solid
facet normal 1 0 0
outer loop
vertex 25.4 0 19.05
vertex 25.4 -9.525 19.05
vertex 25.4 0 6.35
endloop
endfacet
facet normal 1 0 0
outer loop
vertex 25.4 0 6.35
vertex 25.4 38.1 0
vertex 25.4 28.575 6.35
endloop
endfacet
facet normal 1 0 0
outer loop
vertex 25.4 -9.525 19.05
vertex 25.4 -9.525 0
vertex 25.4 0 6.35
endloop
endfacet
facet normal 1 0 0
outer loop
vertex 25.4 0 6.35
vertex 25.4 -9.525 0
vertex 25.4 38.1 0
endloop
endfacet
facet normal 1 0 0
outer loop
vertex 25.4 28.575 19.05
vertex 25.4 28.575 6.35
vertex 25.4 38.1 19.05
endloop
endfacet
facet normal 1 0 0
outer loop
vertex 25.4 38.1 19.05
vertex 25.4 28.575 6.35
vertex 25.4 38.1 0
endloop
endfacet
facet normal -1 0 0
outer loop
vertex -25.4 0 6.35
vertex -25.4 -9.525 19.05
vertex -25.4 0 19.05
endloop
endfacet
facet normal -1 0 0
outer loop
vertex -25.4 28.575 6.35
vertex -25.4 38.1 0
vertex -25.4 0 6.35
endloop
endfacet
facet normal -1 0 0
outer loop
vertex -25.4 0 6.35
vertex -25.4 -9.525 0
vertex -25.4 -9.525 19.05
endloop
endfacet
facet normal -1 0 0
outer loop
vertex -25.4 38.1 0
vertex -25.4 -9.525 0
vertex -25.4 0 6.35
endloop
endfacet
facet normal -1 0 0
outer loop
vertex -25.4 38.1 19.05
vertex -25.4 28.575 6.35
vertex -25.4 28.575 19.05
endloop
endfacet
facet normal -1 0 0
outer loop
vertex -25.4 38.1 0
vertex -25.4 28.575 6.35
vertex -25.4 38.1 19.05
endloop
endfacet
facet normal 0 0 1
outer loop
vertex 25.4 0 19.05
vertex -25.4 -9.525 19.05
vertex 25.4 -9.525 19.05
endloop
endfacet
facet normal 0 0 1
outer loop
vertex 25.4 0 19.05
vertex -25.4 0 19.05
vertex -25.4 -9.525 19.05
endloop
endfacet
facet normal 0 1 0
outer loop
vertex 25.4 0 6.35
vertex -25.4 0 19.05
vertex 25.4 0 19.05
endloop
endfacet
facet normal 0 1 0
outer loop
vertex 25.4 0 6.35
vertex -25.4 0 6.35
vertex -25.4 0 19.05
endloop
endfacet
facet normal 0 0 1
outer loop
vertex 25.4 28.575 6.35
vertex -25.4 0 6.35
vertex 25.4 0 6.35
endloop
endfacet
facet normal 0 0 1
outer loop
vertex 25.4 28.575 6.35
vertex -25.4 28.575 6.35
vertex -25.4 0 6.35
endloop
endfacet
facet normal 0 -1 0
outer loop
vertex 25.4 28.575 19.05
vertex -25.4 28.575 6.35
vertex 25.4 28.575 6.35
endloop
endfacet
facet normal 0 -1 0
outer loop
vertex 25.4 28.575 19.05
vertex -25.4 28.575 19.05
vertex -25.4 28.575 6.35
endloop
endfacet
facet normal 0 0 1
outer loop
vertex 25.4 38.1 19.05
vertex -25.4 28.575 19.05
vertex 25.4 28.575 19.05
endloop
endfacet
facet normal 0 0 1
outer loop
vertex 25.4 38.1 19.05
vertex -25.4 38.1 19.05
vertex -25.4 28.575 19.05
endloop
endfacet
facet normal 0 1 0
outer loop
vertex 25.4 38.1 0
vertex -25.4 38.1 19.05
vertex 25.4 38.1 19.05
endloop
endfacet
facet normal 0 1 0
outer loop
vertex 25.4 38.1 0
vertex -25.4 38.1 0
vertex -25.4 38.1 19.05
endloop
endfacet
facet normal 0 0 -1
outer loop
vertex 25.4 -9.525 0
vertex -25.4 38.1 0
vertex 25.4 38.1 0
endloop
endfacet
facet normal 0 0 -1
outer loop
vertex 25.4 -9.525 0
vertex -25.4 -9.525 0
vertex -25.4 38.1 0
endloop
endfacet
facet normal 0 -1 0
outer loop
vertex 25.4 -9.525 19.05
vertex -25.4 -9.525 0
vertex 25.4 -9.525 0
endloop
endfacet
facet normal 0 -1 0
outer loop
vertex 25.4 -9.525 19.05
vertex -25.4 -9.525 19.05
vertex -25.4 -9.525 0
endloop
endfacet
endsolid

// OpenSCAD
module showerDoorstop() {
    length = 128;
    height = 48;
    innerWidth = 72;
    wallThickness = 24;
    floorThickness = 16;
    scaleFactor = 25.4 / 64;
   
   
    module _floor() {
        polygon(points=[
            [0, 0],
            [0, innerWidth],
            [floorThickness, innerWidth],
            [floorThickness, 0],
        ]);
    };
    
    module _side() {
        polygon(points=[
            [0, 0],
            [0, wallThickness],
            [height, wallThickness],
            [height, 0],
        ]);
    }
    
    scale([scaleFactor, scaleFactor, scaleFactor]) {
        rotate([0, -90, 0]) {
            linear_extrude(height=length, center=true) {
                union() {
                    _floor();
                    translate(v=[0, -wallThickness, 0]) {
                        _side();
                    }
                     translate(v=[0, innerWidth, 0]) {
                        _side();
                    }
                }
            }
        }
    }
}

showerDoorstop();
    

  
